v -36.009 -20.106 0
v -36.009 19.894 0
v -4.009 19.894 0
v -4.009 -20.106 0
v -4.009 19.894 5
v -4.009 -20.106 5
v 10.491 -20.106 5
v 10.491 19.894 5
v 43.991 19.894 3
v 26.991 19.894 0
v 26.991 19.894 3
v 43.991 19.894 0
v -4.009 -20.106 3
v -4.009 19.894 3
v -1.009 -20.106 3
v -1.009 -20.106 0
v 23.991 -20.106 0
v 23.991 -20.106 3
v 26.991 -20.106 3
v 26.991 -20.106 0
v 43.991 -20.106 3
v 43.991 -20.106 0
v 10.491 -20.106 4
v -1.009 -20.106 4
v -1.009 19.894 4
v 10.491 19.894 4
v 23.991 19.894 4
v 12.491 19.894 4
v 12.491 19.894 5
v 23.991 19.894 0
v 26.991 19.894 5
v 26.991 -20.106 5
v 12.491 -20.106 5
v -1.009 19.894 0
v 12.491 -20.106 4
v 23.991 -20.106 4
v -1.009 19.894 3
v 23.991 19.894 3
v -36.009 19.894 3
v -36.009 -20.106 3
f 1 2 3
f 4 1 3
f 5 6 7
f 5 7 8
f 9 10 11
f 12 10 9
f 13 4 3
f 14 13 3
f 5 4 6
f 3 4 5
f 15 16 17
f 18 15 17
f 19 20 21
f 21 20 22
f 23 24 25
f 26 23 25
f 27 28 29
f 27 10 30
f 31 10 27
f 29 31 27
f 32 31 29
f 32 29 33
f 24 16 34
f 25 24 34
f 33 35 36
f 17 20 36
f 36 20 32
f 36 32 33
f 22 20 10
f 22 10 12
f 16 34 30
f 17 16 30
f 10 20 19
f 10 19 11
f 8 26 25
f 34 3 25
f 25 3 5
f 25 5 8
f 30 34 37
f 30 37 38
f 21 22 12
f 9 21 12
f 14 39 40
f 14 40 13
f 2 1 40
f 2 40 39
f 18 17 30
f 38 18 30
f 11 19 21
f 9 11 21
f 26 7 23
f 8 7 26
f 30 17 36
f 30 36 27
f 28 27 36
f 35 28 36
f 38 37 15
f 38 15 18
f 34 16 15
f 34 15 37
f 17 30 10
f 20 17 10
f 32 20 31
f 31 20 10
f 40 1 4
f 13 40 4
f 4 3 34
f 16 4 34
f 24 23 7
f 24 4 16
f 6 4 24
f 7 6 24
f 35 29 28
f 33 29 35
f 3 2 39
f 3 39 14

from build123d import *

# Parameters (mm, degrees)
F0_W     = 32
F0_H     = 40
F0_W_2   = 25
F0_W_3   = 17
F1_DEPTH = 3
F0_W_4   = 3
F2_DEPTH = 5
F3_W     = 40
F3_H     = 1
F4_DEPTH = 11.5
F5_W     = 40
F5_H     = 1
F6_DEPTH = 11.5


with BuildPart() as f1:
    # F0 (on Top) → F1 (new body)
    with BuildSketch(Plane.XY):
        with Locations((-20.00937, -0.105833)):
            Rectangle(F0_W, F0_H)
        with Locations((11.49063, -0.105833)):
            Rectangle(F0_W_2, F0_H)
        with Locations((35.49063, -0.105833)):
            Rectangle(F0_W_3, F0_H)
    extrude(amount=F1_DEPTH)


with BuildPart() as f2:
    # F0 (on Top) → F2 (new body)
    with BuildSketch(Plane.XY):
        with Locations((-2.50937, -0.105833)):
            Rectangle(F0_W_4, F0_H)
        with Locations((25.49063, -0.105833)):
            Rectangle(F0_W_4, F0_H)
    extrude(amount=F2_DEPTH)

    # F3 (on face) → F4 (join)
    with BuildSketch(Plane.YZ.offset(-1.00937)):
        with Locations((-0.105833, 4.5)):
            Rectangle(F3_W, F3_H)
    extrude(amount=F4_DEPTH)

    # F5 (on face) → F6 (join)
    with BuildSketch(Plane(origin=(23.99063, 0, 0), x_dir=(0, -1, 0), z_dir=(-1, 0, 0))):
        with Locations((0.105833, 4.5)):
            Rectangle(F5_W, F5_H)
    extrude(amount=F6_DEPTH)


solid = Compound([f1.part, f2.part])
